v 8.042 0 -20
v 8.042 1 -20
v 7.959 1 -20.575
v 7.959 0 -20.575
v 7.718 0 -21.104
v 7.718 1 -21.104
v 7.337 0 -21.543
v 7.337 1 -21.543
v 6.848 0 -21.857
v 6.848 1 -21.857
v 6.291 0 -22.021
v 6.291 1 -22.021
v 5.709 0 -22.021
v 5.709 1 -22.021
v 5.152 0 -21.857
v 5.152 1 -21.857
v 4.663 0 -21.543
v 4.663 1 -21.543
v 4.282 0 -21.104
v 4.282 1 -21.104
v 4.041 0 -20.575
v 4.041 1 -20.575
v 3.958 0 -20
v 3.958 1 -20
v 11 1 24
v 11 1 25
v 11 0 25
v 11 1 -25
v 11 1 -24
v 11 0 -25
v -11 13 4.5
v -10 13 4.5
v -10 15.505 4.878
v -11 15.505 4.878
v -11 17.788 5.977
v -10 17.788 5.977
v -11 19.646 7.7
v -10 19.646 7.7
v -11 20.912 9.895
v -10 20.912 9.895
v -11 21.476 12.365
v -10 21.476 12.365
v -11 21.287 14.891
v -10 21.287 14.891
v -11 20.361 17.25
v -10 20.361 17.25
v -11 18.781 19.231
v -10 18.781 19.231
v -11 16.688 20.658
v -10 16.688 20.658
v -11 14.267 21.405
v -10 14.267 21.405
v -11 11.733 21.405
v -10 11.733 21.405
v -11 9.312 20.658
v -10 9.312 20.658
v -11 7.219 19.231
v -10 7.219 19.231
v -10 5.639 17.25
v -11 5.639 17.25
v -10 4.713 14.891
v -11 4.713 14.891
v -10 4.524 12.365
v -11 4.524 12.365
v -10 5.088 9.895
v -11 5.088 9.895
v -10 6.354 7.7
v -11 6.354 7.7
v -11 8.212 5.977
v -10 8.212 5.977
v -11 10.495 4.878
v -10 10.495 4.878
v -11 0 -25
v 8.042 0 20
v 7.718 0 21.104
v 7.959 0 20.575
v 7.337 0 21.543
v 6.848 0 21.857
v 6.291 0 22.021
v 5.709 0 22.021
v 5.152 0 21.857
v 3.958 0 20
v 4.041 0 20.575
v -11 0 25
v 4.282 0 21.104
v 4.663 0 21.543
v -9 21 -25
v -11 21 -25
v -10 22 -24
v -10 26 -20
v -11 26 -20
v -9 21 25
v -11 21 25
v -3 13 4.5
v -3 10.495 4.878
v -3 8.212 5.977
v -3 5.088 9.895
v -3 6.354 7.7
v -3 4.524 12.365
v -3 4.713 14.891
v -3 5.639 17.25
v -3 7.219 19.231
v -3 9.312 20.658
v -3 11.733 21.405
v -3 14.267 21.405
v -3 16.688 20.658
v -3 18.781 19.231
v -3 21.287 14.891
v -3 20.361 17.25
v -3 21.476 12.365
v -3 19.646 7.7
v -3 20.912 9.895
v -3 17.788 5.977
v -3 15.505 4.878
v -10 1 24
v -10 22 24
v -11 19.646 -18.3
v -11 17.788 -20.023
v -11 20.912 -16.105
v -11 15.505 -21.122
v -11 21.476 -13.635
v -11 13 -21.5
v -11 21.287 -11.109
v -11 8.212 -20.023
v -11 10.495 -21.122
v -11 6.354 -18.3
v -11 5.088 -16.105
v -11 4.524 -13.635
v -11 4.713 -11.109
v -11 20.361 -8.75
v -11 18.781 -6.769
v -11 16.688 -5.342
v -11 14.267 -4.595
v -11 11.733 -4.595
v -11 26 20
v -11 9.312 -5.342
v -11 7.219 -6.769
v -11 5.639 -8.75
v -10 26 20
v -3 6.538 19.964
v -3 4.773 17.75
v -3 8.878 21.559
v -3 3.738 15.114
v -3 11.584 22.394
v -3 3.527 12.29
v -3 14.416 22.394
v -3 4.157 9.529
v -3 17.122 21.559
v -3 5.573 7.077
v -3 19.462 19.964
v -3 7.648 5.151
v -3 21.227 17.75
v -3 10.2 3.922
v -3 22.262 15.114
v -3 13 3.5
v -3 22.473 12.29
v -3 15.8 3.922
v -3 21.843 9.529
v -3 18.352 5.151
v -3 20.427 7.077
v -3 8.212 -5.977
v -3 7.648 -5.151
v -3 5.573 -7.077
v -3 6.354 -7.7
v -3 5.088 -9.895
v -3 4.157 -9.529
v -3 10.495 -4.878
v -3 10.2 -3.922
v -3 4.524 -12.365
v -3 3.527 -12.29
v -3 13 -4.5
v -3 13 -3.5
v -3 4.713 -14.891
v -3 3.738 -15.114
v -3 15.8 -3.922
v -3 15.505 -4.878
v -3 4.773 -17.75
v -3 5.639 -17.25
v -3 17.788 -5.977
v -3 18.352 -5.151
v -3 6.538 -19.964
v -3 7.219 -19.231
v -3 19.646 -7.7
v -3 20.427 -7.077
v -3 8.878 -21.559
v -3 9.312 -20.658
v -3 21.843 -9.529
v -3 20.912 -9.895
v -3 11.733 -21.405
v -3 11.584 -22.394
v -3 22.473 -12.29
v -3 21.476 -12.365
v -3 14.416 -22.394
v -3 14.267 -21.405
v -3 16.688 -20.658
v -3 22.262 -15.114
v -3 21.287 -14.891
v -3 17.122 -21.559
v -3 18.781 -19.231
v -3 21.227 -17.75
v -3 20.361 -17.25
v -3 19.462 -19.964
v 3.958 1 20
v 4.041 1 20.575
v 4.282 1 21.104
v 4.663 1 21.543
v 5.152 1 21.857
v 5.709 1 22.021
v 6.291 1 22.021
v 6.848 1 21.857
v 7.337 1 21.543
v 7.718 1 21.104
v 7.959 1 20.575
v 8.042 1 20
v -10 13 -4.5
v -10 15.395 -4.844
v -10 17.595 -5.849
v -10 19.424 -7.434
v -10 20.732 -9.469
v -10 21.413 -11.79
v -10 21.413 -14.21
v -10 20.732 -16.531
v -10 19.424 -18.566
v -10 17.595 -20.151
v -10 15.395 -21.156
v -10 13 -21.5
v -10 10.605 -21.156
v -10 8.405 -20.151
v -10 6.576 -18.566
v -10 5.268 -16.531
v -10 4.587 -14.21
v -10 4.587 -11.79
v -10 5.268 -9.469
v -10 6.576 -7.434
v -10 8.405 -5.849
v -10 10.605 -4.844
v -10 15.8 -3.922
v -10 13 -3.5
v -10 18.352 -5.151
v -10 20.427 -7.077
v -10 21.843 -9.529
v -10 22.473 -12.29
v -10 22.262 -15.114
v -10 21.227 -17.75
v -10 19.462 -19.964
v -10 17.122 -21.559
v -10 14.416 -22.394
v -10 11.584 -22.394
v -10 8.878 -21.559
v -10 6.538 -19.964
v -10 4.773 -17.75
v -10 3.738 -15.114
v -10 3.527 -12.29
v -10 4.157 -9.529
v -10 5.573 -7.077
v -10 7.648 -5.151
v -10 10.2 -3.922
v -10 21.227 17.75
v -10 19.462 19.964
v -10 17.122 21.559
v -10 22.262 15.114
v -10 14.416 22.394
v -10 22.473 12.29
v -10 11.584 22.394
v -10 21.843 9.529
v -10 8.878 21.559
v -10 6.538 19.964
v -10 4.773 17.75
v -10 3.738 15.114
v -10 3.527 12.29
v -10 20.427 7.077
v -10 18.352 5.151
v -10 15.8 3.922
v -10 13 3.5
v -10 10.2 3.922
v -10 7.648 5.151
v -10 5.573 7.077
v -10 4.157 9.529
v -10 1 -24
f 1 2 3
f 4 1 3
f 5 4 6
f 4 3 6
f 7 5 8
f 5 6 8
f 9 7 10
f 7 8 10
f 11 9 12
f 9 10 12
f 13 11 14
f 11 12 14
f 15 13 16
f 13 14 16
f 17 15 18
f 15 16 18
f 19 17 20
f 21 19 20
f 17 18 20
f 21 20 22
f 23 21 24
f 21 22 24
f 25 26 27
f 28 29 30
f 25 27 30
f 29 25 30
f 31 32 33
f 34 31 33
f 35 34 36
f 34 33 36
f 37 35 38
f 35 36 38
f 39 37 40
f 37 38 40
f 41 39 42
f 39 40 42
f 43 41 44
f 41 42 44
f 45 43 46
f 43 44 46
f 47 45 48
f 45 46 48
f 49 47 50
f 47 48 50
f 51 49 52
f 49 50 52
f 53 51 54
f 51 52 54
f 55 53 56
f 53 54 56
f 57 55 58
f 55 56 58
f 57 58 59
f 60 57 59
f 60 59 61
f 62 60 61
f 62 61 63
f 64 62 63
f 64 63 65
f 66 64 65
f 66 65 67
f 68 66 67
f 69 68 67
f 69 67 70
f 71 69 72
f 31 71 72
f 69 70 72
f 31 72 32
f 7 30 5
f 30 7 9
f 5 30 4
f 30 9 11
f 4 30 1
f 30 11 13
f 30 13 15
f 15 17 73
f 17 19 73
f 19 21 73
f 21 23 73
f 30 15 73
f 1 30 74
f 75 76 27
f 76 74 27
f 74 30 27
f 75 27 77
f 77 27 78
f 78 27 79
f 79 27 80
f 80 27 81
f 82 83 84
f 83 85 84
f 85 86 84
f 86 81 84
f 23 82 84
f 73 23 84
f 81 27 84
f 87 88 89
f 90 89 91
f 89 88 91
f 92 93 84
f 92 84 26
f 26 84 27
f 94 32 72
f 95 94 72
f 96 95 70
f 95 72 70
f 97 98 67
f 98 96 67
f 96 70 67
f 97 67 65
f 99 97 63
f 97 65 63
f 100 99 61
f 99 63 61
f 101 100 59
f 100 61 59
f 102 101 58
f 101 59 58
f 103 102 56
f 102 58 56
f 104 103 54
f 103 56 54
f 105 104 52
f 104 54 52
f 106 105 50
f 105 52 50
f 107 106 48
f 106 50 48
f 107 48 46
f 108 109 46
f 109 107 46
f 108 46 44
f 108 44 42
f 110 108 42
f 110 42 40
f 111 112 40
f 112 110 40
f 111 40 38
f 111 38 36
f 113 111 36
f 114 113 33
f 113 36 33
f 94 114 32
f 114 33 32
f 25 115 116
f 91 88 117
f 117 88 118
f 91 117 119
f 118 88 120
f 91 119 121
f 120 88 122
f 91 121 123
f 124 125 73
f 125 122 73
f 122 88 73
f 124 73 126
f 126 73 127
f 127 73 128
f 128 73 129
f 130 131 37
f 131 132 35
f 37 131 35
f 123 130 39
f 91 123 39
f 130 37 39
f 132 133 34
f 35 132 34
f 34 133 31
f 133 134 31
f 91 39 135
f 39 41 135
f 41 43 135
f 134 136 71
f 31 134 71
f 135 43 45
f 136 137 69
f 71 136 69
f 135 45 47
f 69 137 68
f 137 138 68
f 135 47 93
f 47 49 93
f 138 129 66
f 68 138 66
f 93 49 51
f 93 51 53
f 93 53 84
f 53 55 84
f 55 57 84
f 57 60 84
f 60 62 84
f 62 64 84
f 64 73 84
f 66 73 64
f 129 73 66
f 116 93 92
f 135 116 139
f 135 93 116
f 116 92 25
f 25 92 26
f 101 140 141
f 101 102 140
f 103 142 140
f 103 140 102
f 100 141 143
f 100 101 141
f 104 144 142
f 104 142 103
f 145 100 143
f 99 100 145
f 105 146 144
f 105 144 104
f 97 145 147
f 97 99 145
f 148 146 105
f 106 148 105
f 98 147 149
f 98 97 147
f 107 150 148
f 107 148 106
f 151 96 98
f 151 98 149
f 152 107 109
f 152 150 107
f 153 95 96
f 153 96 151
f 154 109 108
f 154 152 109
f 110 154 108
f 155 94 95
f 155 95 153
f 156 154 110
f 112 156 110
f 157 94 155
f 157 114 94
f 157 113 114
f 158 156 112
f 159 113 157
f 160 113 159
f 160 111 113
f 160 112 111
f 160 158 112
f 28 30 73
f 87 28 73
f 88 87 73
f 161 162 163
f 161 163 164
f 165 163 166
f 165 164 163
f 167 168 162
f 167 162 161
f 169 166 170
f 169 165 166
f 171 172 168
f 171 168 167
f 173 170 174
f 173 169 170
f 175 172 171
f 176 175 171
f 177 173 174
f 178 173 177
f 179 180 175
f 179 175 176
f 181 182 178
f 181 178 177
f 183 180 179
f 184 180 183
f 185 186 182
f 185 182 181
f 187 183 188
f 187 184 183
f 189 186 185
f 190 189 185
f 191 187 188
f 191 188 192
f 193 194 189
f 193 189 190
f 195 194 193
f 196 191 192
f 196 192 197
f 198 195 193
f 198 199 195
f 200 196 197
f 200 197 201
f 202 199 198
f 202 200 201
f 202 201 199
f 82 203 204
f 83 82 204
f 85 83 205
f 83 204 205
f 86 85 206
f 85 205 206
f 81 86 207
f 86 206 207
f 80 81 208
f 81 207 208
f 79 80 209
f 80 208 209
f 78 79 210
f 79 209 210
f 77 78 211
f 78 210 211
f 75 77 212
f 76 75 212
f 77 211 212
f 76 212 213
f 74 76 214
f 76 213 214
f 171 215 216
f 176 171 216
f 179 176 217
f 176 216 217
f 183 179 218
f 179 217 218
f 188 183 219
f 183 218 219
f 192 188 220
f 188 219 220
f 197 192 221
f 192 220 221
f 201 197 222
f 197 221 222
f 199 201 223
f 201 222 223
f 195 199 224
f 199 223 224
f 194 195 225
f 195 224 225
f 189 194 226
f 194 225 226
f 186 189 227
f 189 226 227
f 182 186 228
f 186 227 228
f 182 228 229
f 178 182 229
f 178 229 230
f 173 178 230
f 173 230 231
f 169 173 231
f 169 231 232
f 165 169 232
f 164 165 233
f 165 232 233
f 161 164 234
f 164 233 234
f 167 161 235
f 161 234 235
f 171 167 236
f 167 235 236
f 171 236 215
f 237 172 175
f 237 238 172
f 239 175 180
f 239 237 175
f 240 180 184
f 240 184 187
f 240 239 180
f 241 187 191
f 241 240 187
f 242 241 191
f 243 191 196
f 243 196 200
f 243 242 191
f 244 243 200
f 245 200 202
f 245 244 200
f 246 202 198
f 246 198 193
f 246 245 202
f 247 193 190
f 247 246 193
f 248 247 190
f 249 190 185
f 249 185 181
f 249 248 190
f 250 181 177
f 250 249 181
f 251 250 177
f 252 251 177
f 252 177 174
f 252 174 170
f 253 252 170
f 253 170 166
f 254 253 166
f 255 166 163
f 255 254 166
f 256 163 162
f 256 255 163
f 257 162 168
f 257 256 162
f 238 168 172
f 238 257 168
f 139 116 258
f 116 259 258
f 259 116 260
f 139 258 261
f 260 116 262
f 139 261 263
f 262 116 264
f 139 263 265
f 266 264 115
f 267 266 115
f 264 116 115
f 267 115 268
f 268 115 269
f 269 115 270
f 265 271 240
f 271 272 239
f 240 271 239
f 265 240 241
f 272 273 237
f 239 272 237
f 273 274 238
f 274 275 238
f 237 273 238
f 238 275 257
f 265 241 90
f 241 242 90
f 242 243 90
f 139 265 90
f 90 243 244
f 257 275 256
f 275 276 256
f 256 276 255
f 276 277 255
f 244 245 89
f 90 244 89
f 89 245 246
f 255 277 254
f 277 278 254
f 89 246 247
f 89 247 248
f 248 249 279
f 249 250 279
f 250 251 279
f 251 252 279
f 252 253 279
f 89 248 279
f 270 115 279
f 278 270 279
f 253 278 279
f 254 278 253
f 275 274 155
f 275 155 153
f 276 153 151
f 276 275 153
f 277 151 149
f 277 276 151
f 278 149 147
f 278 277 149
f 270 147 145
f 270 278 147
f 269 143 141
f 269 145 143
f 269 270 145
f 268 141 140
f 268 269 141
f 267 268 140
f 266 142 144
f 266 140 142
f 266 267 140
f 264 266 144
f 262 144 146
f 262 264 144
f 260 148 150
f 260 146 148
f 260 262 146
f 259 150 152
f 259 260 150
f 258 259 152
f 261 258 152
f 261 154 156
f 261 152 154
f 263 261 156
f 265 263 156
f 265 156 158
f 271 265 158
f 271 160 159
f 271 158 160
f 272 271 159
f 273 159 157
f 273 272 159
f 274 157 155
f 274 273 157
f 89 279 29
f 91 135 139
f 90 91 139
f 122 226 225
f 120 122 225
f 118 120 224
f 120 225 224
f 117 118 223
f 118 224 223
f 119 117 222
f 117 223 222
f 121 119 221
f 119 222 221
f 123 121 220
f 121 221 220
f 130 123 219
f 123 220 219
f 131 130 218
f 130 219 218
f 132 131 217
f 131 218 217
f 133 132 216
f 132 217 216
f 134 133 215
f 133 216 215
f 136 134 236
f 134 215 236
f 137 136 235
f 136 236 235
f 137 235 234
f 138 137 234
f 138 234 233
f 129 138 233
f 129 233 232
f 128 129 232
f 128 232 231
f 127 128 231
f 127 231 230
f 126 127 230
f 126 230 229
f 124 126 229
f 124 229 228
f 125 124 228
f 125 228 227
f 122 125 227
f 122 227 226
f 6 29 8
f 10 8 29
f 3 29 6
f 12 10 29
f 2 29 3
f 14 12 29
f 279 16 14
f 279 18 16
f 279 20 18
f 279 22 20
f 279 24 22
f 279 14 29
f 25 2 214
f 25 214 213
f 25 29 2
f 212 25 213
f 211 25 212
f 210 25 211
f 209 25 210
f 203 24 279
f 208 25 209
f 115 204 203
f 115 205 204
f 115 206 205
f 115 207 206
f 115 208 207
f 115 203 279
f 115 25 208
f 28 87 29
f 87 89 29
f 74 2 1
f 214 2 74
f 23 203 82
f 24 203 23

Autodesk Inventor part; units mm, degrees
ref_plane "YZ Plane" through (0, 0, 0) normal (1, 0, 0) x (0, 1, 0)
ref_plane "XZ Plane" through (0, 0, 0) normal (0, 1, 0) x (-1, 0, 0)
ref_plane "XY Plane" through (0, 0, 0) normal (0, 0, 1) x (1, 0, 0)
sketch "Sketch1" plane through (0, 0, 0) normal (0, 1, 0) x (-1, 0, 0)
  line L0 (-11, 25) -> (-11, -25)
  line L1 (-11, -25) -> (11, -25)
  line L2 (11, -25) -> (11, 25)
  line L3 (11, 25) -> (-11, 25)
  line L4 (-11, 25) -> (11, -25) construction
  line L5 (-11, -25) -> (11, 25) construction
  line L6 (11, 25) -> (10, 25)
  line L7 (10, 25) -> (10, -25)
  line L8 (11, 25) -> (11, 24)
  line L9 (11, 24) -> (-11, 24)
  line L10 (11, -25) -> (11, -24)
  line L11 (11, -24) -> (-11, -24)
  point P0 (0, 0)
  dimension "d0" = 50
  dimension "d1" = 22
  dimension "d2" = 1
  dimension "d3" = 1
  dimension "d4" = 1
extrude "Extrusion1" add sketch "Sketch1" along normal blind 1
sketch "Sketch2" plane through (0, 1, 0) normal (0, 1, 0) x (1, 0, 0)
  line L0 (11, -25) -> (11, 25) projected
  line L1 (-11, -25) -> (11, -25) projected
  line L2 (11, -25) -> (-11, -25)
  line L3 (-11, -25) -> (-11, -24)
  line L4 (-11, 25) -> (-11, -25) projected
  line L5 (-11, -24) -> (11, -24)
  line L6 (-11, -25) -> (-10, -25)
  line L7 (-10, -25) -> (-10, 25)
  line L8 (11, 25) -> (-11, 25) projected
  line L9 (-11, 25) -> (-11, 24)
  line L10 (-11, 24) -> (11, 24)
  point P0 (0, 0)
  dimension "d7" = 1
  dimension "d8" = 1
  dimension "d9" = 1
extrude "Extrusion2" add sketch "Sketch2" along normal blind 25 contours L1 L3 L5 L7 | L5 L4 L10 L7 | L10 L4 L8 L7
extrude "Extrusion3" add sketch "Sketch2" along normal blind 25 contours L1 L7 L5 L0 | L1 L3 L5 L7 | L10 L7 L8 L0 | L10 L4 L8 L7
sketch "Sketch3" plane through (-11, 0, 25) normal (0, 0, 1) x (1, 0, 0)
  point P0 (11, 0)
sketch "Sketch4" plane through (-11, 0, -25) normal (-1, 0, 0) x (0, 0, 1)
  line L0 (49, 26) -> (1, 26) projected
  line L1 (25, 26) -> (45, 26)
  line L2 (25, 26) -> (5, 26)
  line L3 (50, 0) -> (50, 26) projected
  line L4 (50, 26) -> (50, 21)
  line L5 (50, 21) -> (45, 26)
  line L6 (0, 0) -> (0, 26) projected
  line L7 (0, 26) -> (0, 21)
  line L8 (0, 21) -> (5, 26)
  line L9 (50, 26) -> (45, 26)
  line L10 (0, 26) -> (5, 26)
  line L11 (0, 26) -> (50, 26) projected
  point P0 (25, 0)
  dimension "d14" = 20
  dimension "d15" = 20
  dimension "d16" = 5
  dimension "d17" = 5
extrude "Extrusion4" cut sketch "Sketch4" against normal blind 25
sketch "Sketch5" plane through (-11, 0, 25) normal (0, 0, 1) x (1, 0, 0)
  line L0 (1, 22) -> (1, 26) projected
  line L1 (1, 22) -> (22, 1)
  line L2 (22, 22) -> (1, 22) projected
  line L3 (1, 22) -> (22, 22)
  line L4 (22, 22) -> (22, 1)
  point P0 (11, 0)
extrude "Extrusion5" cut sketch "Sketch5" against normal through all
sketch "Sketch6" plane through (-10, 1, 24) normal (1, 0, 0) x (0, 0, -1)
  line L0 (4, 25) -> (44, 25) projected
  line L1 (24, 25) -> (24, -1) construction
  line L2 (0, 21) -> (0, 0) construction
  line L3 (0, 12) -> (48, 12) construction
  line L4 (48, 0) -> (48, 21) construction
  line L5 (24, 12) -> (20.5, 12) construction
  line L6 (20.5, 12) -> (27.5, 12) construction
  line L7 (20.5, 12) -> (1.5, 12) construction
  circle A0 centre (11, 12) radius 9.5
  circle A1 centre (11, 12) radius 8.5
  dimension "d22" = 3.5
  dimension "d23" = 7
  dimension "d24" = 19
  dimension "d25" = 1
extrude "Extrusion6" add sketch "Sketch6" along normal blind 7
extrude "Extrusion7" cut sketch "Sketch6" against normal blind 7 contours A1
ref_plane "Work Plane1" through (-11, 0, 0) normal (0, 0, 1) x (1, 0, 0)
mirror "Mirror1" about plane through (-11, 0, 0) normal (0, 0, 1) of "Extrusion6"
mirror "Mirror2" about plane through (-11, 0, 0) normal (0, 0, 1) of "Extrusion6"
sketch "Sketch7" plane through (-10, 13, -13) normal (1, 0, 0) x (0, 0, -1)
  circle A0 centre (0, 0) radius 8.5 projected
  point P0 (-13, -13)
extrude "Extrusion8" cut sketch "Sketch7" against normal blind 7
sketch "Sketch8" plane through (0, 1, 0) normal (0, 1, 0) x (1, 0, 0)
  line L0 (-10, -24) -> (11, -24) projected
  line L1 (11, -24) -> (6, -24)
  line L2 (6, -24) -> (6, -20) construction
  line L3 (11, 24) -> (-10, 24) construction
  line L4 (11, 24) -> (6, 24) construction
  line L5 (6, 24) -> (6, 20) construction
  line L6 (6, 20) -> (6, -20) construction
  line L7 (8.0416, 20) -> (8.0416, -20)
  line L8 (3.9584, -20) -> (3.9584, 20)
  arc A0 (8.0416, 20) -> (3.9584, 20) centre (6, 20) ccw
  arc A1 (3.9584, -20) -> (8.0416, -20) centre (6, -20) ccw
  point P0 (0, 0)
  point P1 (6, 0)
  dimension "d32" = 5
  dimension "d33" = 4
  dimension "d34" = 5
  dimension "d35" = 4
extrude "Extrusion9" cut sketch "Sketch8" against normal blind 7
properties part number "Ultra Sonic Sensor Mounting"
